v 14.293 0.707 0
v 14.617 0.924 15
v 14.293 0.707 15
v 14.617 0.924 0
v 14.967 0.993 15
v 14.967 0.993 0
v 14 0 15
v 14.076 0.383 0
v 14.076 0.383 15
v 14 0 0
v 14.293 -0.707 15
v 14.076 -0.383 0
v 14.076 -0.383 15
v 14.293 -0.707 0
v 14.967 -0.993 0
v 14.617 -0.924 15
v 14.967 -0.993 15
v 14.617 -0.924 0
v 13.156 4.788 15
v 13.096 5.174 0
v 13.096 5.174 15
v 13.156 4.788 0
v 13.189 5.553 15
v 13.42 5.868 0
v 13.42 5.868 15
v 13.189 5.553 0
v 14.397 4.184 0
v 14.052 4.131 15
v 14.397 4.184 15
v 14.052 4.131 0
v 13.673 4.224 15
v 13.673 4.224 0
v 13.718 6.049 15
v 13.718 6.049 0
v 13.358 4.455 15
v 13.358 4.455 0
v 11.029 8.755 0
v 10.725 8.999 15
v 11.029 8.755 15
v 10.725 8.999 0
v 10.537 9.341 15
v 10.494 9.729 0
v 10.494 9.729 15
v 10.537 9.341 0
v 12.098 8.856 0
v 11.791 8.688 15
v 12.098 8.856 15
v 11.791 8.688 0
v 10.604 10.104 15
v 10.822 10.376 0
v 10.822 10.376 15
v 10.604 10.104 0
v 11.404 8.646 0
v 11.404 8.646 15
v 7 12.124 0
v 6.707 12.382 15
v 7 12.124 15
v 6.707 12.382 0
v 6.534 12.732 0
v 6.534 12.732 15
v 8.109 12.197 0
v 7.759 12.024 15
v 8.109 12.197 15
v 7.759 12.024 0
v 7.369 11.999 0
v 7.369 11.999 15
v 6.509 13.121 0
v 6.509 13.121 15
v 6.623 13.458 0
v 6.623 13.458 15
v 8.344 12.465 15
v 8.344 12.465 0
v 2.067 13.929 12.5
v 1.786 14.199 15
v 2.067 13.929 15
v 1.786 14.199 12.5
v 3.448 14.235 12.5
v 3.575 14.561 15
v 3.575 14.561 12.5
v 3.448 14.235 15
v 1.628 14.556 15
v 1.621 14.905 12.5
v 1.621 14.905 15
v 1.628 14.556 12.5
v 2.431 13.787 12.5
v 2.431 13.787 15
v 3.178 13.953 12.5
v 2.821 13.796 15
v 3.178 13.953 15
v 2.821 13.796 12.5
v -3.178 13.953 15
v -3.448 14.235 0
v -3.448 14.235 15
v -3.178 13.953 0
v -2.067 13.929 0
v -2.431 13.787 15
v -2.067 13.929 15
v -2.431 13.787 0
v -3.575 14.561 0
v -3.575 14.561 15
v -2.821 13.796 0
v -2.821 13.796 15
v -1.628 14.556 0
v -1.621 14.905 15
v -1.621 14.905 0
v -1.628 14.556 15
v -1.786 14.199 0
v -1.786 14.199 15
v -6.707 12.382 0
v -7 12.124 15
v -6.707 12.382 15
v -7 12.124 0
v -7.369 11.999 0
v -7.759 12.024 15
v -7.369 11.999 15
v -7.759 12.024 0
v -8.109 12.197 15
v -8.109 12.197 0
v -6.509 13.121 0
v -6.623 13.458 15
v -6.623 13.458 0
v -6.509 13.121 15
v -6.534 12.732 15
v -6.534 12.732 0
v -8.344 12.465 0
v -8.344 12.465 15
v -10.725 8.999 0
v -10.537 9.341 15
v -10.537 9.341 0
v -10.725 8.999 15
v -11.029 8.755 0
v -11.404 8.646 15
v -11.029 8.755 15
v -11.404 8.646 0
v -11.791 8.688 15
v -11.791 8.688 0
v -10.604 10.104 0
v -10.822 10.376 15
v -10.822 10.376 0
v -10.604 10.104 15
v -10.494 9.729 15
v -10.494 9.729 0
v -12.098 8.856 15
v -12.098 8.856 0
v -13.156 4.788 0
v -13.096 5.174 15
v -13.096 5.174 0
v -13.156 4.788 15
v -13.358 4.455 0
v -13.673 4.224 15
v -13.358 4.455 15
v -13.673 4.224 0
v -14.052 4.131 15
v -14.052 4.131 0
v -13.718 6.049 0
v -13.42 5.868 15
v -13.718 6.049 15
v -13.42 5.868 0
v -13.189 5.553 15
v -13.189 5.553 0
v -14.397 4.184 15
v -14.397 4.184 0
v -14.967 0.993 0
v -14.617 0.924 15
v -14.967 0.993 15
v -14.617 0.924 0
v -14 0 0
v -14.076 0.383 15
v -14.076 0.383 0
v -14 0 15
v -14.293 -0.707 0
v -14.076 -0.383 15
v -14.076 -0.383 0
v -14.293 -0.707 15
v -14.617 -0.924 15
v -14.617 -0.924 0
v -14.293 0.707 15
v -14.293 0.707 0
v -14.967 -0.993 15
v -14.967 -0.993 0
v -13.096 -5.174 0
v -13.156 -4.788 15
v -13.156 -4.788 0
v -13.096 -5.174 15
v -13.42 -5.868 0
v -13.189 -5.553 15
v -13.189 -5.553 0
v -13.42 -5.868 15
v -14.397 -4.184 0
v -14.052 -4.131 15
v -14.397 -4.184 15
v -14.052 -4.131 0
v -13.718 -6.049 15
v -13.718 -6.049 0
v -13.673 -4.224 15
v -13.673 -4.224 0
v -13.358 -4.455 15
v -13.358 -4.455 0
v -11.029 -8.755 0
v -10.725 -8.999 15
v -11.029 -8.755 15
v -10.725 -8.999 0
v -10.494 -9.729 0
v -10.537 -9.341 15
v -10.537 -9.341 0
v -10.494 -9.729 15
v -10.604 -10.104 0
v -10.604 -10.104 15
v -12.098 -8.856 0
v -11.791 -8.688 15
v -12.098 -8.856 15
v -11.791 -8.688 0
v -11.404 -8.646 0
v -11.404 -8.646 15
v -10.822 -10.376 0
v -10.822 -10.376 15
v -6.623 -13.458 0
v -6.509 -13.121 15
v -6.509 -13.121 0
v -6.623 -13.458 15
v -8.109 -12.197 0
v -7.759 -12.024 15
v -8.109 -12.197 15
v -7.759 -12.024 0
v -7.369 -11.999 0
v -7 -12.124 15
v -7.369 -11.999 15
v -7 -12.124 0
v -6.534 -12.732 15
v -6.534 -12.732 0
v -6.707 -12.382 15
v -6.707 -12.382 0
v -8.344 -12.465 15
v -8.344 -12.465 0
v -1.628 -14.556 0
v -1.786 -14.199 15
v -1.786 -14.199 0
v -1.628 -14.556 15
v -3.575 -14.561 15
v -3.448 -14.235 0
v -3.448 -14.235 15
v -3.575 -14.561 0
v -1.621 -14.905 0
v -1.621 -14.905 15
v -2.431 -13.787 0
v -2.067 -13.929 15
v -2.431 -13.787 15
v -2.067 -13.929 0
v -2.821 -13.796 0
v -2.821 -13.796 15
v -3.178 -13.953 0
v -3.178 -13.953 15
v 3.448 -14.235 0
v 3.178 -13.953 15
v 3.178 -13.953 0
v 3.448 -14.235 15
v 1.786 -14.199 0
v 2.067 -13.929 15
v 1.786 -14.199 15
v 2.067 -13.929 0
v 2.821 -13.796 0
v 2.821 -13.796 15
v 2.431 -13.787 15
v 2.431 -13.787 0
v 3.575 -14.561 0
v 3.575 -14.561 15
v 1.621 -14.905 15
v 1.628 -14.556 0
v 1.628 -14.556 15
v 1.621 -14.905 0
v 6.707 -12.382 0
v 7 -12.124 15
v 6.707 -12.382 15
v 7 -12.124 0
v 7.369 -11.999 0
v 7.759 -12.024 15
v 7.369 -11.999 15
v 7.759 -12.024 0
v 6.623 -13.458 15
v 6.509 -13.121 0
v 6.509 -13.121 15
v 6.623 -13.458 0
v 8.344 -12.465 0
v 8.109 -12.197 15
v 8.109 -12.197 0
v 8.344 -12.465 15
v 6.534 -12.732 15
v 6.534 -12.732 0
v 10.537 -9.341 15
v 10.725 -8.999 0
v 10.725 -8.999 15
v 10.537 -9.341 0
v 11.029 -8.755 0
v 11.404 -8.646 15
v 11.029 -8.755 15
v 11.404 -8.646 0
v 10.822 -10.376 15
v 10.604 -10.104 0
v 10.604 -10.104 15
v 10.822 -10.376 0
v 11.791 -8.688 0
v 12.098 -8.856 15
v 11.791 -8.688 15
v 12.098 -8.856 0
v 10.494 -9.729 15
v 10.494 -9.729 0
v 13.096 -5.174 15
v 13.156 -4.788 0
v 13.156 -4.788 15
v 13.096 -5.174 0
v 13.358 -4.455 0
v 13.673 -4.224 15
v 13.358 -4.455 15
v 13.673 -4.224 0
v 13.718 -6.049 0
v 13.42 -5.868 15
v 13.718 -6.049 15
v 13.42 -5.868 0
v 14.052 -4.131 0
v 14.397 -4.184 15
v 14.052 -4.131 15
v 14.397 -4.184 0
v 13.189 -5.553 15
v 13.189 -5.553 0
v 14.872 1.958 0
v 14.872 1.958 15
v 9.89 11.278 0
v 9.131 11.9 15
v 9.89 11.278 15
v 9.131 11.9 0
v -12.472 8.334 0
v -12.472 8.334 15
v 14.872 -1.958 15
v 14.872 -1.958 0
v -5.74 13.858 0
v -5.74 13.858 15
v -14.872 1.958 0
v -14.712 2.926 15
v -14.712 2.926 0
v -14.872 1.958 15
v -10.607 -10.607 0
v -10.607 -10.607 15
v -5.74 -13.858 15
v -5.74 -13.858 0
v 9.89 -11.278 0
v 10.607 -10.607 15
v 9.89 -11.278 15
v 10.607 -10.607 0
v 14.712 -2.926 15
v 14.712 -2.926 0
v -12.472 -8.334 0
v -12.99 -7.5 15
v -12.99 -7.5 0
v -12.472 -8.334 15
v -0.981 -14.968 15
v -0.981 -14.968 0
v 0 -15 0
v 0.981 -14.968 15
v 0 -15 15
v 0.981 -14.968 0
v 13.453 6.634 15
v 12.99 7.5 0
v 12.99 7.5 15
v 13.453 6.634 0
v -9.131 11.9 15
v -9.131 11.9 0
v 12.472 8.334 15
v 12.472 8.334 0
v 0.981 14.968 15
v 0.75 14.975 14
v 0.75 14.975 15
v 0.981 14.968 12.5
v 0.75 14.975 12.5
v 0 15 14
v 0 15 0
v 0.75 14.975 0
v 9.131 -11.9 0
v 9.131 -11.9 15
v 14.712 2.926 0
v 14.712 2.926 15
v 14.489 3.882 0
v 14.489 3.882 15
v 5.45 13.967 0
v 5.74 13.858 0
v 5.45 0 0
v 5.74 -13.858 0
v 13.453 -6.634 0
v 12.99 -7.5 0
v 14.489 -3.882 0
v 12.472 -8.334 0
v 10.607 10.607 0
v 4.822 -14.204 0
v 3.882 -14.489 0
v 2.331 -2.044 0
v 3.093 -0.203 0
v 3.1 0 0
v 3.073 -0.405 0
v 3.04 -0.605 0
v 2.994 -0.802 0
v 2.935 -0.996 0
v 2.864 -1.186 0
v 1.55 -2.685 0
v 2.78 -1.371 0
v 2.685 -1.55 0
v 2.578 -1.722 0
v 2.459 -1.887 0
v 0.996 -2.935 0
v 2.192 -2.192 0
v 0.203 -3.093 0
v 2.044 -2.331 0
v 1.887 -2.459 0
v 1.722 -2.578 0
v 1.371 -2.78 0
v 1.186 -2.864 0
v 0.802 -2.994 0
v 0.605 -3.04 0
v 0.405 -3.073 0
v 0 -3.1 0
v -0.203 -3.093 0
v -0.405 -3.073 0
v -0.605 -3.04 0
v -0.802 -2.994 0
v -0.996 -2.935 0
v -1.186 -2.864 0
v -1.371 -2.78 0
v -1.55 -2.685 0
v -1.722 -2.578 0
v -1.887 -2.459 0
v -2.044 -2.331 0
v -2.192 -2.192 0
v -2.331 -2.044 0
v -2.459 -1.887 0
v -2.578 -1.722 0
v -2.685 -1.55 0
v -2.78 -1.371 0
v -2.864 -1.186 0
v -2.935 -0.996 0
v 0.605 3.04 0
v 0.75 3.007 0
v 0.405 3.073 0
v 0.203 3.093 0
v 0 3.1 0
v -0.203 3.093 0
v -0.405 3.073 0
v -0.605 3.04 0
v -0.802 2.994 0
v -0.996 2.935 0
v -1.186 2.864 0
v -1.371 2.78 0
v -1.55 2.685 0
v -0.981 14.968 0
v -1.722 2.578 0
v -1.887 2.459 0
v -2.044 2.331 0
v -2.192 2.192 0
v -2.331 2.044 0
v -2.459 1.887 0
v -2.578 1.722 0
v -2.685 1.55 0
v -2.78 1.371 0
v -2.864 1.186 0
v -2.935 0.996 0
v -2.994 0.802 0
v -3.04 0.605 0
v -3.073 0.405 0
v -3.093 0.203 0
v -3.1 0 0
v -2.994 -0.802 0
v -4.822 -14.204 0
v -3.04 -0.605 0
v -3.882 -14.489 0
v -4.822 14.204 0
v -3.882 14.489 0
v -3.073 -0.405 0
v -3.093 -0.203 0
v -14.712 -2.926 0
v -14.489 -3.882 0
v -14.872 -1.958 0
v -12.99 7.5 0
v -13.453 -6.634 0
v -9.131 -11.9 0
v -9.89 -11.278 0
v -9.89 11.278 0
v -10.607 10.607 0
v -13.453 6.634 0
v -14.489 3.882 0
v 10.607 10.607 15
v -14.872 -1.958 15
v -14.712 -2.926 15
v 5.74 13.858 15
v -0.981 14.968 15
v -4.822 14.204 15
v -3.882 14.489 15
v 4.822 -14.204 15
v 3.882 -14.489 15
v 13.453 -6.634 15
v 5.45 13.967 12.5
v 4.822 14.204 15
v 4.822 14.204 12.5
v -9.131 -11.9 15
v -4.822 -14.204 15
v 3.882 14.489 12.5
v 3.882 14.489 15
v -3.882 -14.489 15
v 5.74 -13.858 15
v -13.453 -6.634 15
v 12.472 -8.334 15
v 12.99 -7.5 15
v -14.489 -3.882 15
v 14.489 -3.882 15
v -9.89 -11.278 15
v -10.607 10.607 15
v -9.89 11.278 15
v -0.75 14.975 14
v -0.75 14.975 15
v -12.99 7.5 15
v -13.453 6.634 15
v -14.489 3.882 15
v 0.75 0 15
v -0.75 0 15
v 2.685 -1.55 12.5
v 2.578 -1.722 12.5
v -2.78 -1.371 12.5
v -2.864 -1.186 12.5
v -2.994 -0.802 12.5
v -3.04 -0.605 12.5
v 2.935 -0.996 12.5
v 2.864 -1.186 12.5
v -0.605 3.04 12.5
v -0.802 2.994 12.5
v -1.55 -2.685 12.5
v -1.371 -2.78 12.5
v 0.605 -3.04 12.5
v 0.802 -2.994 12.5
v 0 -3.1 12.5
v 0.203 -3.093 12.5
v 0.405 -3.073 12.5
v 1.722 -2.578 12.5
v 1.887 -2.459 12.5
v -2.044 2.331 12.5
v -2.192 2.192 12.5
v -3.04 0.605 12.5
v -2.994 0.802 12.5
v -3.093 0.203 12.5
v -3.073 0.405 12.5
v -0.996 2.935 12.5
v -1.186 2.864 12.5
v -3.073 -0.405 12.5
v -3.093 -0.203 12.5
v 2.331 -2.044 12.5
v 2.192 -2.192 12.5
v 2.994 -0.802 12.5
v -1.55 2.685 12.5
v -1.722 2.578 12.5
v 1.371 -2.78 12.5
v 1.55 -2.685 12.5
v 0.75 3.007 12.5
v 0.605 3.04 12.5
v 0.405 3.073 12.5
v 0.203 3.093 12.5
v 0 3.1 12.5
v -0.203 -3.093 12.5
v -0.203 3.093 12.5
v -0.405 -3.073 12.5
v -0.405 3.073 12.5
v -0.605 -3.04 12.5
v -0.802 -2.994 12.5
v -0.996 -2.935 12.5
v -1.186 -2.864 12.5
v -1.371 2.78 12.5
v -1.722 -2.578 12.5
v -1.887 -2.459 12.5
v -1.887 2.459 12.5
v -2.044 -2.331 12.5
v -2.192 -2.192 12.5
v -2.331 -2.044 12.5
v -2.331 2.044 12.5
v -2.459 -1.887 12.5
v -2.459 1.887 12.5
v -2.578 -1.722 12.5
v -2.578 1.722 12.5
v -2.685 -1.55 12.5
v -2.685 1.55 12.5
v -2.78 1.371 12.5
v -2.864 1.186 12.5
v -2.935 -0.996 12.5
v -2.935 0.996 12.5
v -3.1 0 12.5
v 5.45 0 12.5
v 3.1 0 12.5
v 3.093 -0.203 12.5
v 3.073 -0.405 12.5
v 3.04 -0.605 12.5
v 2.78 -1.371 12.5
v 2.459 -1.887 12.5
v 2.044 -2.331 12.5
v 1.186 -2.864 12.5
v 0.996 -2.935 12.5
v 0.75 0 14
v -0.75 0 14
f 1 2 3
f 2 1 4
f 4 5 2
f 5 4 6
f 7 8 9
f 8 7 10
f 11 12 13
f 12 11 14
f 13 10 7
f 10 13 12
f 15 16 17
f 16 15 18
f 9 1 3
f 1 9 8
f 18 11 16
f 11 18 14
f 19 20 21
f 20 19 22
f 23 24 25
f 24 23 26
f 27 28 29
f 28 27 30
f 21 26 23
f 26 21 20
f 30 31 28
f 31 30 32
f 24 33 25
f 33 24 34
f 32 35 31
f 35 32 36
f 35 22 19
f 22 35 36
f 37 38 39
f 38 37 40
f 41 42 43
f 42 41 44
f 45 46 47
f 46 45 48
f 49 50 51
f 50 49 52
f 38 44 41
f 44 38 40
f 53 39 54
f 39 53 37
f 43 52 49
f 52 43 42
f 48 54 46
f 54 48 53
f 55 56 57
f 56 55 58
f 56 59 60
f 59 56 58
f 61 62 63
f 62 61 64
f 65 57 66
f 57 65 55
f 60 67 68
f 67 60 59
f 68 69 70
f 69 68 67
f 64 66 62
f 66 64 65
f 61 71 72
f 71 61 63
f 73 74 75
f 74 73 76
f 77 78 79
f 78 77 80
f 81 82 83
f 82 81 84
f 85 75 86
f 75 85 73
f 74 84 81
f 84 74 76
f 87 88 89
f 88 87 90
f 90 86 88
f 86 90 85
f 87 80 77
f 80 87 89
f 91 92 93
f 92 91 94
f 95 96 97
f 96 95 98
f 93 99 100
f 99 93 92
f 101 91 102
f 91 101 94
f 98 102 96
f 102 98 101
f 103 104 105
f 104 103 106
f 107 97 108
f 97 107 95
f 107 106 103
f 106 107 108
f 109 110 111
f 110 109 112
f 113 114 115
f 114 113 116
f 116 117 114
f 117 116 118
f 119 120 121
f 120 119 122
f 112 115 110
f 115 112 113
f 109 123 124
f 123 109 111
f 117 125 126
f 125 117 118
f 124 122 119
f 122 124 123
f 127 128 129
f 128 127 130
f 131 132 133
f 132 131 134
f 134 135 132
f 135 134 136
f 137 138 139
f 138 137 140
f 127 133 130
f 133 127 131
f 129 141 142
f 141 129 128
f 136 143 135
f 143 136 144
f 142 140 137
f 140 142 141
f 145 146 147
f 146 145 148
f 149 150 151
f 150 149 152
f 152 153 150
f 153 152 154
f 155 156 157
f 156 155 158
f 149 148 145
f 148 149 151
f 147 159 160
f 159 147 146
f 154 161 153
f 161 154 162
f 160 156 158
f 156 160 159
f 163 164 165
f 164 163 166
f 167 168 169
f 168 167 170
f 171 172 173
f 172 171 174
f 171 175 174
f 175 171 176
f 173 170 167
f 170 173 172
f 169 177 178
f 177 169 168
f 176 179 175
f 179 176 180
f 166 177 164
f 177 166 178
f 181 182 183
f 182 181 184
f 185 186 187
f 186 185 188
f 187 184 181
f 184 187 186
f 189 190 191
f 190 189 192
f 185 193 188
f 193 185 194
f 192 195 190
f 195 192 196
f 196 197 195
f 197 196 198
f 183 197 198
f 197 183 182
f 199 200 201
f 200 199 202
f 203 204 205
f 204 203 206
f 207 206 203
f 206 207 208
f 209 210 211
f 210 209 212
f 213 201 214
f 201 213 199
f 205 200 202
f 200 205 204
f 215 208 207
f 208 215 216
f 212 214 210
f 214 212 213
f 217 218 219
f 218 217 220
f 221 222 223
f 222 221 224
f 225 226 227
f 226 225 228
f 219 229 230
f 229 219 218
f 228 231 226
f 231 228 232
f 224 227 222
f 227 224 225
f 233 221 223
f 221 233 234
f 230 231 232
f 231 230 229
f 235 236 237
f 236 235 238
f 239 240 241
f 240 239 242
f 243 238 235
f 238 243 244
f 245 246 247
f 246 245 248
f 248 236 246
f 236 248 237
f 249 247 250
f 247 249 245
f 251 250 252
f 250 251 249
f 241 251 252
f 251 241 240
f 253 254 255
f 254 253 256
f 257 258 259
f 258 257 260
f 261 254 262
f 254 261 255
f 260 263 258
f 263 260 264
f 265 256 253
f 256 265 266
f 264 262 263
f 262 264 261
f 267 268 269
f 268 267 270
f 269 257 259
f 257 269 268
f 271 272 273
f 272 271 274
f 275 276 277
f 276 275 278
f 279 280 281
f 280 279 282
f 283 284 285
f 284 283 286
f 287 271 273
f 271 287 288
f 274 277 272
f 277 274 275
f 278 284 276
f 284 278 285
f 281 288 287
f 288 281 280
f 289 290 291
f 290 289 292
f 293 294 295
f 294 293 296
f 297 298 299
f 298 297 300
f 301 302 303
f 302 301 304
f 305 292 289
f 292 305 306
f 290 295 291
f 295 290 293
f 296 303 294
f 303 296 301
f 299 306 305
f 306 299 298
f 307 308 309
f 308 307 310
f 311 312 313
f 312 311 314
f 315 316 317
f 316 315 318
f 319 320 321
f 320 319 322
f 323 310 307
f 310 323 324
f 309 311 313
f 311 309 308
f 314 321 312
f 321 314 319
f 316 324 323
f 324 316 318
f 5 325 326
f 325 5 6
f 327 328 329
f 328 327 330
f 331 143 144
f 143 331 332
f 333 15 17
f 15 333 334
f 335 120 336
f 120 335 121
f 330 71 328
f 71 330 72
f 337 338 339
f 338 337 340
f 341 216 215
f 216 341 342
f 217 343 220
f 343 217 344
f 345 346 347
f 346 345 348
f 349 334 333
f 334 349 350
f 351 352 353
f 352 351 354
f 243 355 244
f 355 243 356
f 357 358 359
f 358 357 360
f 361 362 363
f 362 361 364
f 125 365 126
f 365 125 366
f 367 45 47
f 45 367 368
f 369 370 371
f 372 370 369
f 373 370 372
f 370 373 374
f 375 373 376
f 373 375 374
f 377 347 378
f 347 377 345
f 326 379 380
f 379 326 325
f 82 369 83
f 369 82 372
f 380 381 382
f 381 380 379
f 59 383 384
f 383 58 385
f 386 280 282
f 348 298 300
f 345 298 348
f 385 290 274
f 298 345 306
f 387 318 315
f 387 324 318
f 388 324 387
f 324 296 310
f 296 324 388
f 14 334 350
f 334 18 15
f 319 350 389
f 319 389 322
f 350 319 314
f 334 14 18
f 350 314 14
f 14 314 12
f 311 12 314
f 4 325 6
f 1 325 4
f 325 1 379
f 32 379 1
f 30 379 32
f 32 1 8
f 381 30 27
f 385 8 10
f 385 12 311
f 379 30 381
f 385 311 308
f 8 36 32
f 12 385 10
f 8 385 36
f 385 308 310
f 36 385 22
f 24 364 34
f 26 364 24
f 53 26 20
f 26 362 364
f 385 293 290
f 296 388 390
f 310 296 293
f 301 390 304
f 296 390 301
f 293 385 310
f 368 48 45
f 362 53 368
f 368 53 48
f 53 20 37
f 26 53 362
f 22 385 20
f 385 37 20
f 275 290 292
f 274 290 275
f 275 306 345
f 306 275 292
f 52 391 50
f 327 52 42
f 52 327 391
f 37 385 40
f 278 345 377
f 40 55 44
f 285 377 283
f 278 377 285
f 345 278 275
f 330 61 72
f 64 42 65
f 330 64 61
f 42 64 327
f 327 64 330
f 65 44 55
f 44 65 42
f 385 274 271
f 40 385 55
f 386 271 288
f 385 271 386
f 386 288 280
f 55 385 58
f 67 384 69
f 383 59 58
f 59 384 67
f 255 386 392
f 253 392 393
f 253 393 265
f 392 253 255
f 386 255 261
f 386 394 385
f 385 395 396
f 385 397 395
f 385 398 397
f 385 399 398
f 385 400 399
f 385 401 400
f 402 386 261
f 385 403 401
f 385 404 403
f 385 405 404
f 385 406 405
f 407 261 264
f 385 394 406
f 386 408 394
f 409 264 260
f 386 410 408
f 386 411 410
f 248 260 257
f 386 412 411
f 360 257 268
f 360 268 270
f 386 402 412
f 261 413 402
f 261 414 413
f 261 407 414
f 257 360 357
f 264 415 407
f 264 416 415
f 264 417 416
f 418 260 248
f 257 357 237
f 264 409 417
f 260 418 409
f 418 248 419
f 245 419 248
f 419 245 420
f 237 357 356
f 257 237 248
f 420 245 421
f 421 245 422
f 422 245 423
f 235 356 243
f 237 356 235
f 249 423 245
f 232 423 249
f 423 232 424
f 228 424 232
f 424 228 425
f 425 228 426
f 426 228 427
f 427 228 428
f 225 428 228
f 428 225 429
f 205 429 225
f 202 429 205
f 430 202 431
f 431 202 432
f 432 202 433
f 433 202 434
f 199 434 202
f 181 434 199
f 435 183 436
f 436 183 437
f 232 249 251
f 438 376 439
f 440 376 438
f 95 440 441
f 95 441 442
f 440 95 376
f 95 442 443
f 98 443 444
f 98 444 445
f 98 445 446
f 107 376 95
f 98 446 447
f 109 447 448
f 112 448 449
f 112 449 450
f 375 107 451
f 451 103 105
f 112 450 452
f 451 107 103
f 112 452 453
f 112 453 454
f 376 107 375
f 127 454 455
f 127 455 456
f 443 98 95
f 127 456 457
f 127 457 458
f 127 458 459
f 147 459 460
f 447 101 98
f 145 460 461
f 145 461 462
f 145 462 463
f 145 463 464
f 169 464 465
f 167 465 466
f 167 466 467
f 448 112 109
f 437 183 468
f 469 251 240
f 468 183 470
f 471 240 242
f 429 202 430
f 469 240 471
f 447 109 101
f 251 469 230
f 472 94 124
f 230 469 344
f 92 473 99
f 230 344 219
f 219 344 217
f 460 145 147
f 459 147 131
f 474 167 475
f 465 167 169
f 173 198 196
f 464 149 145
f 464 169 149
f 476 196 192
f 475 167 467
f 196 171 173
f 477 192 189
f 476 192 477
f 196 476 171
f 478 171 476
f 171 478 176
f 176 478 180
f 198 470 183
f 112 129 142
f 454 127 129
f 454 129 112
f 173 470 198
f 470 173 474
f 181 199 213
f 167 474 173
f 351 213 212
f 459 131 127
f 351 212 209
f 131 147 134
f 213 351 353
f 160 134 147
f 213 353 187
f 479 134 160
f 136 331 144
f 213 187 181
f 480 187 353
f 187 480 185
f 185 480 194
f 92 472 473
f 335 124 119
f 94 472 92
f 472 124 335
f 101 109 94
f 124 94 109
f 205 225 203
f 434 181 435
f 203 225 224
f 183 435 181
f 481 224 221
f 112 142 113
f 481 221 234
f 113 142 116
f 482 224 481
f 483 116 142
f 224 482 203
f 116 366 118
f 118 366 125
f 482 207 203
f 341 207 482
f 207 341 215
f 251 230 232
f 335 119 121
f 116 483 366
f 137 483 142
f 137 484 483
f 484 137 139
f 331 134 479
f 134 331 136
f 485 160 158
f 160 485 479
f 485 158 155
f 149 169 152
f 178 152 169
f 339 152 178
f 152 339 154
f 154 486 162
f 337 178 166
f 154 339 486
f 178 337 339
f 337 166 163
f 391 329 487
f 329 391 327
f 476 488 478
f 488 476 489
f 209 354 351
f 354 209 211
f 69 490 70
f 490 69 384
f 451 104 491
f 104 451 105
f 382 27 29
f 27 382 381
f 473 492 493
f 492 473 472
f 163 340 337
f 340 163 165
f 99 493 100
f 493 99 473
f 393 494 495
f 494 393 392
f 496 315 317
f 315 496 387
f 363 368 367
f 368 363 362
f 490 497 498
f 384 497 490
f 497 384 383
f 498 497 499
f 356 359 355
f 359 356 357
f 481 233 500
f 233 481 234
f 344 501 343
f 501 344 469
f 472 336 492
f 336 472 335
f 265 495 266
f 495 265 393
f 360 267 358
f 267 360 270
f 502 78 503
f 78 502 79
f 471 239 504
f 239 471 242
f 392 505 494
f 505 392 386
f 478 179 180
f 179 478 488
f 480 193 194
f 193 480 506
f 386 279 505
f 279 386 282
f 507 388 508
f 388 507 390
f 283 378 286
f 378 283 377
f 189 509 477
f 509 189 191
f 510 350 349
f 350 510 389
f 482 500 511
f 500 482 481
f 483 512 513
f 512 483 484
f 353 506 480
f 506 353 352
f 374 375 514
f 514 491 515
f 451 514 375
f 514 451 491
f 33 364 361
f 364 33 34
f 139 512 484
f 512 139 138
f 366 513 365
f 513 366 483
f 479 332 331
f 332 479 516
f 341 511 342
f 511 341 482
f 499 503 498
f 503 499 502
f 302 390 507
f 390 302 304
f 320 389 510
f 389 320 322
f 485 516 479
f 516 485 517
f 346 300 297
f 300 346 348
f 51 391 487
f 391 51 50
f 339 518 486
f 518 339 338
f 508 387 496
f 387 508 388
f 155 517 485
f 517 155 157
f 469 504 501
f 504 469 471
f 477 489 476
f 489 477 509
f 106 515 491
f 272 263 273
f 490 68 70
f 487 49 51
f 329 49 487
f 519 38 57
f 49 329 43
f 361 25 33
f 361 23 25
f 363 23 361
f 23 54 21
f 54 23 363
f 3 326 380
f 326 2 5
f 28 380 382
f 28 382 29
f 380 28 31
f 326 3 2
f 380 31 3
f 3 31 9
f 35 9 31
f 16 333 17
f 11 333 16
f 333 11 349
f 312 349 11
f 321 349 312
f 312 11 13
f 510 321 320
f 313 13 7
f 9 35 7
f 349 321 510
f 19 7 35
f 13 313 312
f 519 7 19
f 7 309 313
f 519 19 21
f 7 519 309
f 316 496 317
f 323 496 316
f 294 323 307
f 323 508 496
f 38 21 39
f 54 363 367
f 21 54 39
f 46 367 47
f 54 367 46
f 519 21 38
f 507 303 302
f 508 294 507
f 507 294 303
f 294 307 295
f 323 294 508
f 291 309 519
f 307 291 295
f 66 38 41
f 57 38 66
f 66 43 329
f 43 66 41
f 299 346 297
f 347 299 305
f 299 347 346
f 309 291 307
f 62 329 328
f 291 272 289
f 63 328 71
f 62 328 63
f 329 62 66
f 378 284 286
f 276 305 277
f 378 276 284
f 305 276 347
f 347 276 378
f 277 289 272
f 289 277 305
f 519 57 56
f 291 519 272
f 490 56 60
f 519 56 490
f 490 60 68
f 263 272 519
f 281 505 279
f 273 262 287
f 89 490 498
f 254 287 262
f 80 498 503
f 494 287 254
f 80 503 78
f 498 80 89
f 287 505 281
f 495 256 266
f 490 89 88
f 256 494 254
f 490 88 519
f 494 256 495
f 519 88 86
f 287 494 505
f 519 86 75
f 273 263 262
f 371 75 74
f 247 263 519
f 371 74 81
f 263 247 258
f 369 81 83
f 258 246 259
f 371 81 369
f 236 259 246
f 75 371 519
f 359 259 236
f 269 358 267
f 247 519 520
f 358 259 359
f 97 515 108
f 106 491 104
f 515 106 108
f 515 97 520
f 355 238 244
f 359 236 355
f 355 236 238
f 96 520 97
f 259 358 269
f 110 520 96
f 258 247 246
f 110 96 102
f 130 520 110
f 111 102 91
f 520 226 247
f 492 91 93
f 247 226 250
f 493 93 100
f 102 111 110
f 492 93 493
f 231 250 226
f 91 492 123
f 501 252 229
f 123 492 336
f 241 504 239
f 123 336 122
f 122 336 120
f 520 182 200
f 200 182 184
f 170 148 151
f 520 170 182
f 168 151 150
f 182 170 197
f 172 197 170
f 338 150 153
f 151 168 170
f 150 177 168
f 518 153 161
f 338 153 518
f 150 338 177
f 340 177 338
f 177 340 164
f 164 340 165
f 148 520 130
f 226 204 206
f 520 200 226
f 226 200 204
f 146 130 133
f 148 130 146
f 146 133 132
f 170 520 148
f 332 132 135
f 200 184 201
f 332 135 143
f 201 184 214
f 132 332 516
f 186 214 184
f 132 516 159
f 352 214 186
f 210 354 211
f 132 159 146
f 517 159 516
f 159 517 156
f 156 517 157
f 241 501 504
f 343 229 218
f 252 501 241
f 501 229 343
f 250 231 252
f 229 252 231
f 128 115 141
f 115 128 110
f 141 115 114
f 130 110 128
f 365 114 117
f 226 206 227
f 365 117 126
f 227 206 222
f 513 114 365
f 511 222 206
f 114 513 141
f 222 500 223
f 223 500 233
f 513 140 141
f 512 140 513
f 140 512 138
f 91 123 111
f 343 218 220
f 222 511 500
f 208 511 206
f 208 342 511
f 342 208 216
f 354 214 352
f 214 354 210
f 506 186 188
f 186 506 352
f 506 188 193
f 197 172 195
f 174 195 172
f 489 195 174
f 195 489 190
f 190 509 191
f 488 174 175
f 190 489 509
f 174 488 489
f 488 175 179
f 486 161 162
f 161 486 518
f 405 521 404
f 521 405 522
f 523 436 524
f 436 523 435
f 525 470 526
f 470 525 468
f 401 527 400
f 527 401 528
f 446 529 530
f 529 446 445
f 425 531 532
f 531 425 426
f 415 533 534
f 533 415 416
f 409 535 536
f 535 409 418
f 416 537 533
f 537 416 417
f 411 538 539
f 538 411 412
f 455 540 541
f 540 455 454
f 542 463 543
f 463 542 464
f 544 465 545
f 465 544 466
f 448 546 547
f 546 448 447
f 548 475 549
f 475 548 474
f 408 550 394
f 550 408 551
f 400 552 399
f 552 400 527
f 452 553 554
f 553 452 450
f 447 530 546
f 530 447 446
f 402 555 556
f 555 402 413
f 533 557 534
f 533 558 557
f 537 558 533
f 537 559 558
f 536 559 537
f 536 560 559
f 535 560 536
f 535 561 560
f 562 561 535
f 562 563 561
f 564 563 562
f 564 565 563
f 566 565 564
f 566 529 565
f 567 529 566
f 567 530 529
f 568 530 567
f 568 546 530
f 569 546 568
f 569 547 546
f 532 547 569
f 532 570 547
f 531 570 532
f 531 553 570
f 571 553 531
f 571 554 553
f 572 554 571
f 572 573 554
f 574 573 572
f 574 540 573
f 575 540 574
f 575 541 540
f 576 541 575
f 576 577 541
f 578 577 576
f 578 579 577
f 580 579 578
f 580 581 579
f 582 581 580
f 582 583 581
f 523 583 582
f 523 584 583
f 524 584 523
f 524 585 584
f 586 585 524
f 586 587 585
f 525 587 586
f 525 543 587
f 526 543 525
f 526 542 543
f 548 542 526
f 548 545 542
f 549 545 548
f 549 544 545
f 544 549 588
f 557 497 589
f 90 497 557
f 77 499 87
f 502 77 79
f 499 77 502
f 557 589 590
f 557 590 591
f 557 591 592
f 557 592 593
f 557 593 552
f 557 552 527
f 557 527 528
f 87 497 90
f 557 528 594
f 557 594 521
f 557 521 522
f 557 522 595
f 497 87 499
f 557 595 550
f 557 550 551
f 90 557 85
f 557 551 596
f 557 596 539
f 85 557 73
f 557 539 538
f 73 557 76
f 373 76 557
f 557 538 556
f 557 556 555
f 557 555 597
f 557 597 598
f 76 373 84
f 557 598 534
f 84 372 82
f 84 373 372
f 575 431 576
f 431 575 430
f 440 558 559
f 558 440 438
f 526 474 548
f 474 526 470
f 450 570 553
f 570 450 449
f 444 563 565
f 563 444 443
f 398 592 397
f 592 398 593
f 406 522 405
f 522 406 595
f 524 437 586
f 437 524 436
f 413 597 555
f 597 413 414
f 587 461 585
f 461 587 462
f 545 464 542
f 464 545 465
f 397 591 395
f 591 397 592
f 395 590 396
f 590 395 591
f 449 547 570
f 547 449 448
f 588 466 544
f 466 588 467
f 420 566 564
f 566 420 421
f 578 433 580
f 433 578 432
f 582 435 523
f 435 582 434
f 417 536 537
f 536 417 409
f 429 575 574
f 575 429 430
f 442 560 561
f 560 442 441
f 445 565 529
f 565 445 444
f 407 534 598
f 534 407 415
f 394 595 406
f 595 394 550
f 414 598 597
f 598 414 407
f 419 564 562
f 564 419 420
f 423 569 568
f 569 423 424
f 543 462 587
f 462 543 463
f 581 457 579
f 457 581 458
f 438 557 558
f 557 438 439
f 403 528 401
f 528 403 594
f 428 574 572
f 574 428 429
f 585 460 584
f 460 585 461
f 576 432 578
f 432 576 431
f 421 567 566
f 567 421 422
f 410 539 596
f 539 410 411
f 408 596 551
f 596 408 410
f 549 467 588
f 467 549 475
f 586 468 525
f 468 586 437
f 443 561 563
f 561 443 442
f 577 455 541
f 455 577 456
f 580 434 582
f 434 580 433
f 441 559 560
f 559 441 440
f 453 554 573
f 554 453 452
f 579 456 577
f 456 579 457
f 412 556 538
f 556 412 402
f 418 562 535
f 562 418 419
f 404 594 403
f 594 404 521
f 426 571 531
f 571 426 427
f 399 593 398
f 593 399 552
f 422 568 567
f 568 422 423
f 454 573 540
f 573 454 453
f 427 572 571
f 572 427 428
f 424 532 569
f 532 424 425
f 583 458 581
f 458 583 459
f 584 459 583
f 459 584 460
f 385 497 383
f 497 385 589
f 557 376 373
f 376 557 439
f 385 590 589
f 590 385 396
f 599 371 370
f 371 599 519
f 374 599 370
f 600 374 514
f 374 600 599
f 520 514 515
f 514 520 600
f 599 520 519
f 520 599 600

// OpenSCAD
// Replacement knob for hotplate stirrer (D-shaft)
// Print orientation: flat bottom face on bed (z = 0)

// ---- Dimensions (mm) ----
knob_d        = 30;    // knob outer diameter
knob_h        = 15;    // knob height
bore_depth    = 12;    // D-bore depth from bottom face
bore_w        = 4.7;   // D-bore width (flat to opposite side)
bore_d        = 6.2;   // D-bore circle diameter
groove_count  = 18;    // number of grip grooves
groove_d      = 2;     // grip groove diameter
pointer_w     = 1.5;   // pointer groove width
pointer_d     = 1;     // pointer groove depth
eps           = 0.5;   // overcut for clean differences

$fn = 96;

difference() {
    // Main body
    cylinder(d = knob_d, h = knob_h);

    // D-shaped blind bore from bottom face
    translate([0, 0, -eps])
        cylinder(d = bore_d, h = bore_depth + 2 * eps);
    translate([-(bore_w - bore_d) / 2, 0, -eps])
        cube([bore_w, knob_d, bore_depth + 2 * eps]);

    // Vertical grip grooves along full height
    for (i = [0 : groove_count - 1])
        rotate([0, 0, i * 360 / groove_count])
            translate([knob_d / 2, 0, -eps])
                cylinder(d = groove_d, h = knob_h + 2 * eps, $fn = 16);

    // Pointer groove from centre to outer edge, on flat side
    translate([-pointer_w / 2, 0, knob_h - pointer_d])
        cube([pointer_w, knob_d / 2, pointer_d]);
}
